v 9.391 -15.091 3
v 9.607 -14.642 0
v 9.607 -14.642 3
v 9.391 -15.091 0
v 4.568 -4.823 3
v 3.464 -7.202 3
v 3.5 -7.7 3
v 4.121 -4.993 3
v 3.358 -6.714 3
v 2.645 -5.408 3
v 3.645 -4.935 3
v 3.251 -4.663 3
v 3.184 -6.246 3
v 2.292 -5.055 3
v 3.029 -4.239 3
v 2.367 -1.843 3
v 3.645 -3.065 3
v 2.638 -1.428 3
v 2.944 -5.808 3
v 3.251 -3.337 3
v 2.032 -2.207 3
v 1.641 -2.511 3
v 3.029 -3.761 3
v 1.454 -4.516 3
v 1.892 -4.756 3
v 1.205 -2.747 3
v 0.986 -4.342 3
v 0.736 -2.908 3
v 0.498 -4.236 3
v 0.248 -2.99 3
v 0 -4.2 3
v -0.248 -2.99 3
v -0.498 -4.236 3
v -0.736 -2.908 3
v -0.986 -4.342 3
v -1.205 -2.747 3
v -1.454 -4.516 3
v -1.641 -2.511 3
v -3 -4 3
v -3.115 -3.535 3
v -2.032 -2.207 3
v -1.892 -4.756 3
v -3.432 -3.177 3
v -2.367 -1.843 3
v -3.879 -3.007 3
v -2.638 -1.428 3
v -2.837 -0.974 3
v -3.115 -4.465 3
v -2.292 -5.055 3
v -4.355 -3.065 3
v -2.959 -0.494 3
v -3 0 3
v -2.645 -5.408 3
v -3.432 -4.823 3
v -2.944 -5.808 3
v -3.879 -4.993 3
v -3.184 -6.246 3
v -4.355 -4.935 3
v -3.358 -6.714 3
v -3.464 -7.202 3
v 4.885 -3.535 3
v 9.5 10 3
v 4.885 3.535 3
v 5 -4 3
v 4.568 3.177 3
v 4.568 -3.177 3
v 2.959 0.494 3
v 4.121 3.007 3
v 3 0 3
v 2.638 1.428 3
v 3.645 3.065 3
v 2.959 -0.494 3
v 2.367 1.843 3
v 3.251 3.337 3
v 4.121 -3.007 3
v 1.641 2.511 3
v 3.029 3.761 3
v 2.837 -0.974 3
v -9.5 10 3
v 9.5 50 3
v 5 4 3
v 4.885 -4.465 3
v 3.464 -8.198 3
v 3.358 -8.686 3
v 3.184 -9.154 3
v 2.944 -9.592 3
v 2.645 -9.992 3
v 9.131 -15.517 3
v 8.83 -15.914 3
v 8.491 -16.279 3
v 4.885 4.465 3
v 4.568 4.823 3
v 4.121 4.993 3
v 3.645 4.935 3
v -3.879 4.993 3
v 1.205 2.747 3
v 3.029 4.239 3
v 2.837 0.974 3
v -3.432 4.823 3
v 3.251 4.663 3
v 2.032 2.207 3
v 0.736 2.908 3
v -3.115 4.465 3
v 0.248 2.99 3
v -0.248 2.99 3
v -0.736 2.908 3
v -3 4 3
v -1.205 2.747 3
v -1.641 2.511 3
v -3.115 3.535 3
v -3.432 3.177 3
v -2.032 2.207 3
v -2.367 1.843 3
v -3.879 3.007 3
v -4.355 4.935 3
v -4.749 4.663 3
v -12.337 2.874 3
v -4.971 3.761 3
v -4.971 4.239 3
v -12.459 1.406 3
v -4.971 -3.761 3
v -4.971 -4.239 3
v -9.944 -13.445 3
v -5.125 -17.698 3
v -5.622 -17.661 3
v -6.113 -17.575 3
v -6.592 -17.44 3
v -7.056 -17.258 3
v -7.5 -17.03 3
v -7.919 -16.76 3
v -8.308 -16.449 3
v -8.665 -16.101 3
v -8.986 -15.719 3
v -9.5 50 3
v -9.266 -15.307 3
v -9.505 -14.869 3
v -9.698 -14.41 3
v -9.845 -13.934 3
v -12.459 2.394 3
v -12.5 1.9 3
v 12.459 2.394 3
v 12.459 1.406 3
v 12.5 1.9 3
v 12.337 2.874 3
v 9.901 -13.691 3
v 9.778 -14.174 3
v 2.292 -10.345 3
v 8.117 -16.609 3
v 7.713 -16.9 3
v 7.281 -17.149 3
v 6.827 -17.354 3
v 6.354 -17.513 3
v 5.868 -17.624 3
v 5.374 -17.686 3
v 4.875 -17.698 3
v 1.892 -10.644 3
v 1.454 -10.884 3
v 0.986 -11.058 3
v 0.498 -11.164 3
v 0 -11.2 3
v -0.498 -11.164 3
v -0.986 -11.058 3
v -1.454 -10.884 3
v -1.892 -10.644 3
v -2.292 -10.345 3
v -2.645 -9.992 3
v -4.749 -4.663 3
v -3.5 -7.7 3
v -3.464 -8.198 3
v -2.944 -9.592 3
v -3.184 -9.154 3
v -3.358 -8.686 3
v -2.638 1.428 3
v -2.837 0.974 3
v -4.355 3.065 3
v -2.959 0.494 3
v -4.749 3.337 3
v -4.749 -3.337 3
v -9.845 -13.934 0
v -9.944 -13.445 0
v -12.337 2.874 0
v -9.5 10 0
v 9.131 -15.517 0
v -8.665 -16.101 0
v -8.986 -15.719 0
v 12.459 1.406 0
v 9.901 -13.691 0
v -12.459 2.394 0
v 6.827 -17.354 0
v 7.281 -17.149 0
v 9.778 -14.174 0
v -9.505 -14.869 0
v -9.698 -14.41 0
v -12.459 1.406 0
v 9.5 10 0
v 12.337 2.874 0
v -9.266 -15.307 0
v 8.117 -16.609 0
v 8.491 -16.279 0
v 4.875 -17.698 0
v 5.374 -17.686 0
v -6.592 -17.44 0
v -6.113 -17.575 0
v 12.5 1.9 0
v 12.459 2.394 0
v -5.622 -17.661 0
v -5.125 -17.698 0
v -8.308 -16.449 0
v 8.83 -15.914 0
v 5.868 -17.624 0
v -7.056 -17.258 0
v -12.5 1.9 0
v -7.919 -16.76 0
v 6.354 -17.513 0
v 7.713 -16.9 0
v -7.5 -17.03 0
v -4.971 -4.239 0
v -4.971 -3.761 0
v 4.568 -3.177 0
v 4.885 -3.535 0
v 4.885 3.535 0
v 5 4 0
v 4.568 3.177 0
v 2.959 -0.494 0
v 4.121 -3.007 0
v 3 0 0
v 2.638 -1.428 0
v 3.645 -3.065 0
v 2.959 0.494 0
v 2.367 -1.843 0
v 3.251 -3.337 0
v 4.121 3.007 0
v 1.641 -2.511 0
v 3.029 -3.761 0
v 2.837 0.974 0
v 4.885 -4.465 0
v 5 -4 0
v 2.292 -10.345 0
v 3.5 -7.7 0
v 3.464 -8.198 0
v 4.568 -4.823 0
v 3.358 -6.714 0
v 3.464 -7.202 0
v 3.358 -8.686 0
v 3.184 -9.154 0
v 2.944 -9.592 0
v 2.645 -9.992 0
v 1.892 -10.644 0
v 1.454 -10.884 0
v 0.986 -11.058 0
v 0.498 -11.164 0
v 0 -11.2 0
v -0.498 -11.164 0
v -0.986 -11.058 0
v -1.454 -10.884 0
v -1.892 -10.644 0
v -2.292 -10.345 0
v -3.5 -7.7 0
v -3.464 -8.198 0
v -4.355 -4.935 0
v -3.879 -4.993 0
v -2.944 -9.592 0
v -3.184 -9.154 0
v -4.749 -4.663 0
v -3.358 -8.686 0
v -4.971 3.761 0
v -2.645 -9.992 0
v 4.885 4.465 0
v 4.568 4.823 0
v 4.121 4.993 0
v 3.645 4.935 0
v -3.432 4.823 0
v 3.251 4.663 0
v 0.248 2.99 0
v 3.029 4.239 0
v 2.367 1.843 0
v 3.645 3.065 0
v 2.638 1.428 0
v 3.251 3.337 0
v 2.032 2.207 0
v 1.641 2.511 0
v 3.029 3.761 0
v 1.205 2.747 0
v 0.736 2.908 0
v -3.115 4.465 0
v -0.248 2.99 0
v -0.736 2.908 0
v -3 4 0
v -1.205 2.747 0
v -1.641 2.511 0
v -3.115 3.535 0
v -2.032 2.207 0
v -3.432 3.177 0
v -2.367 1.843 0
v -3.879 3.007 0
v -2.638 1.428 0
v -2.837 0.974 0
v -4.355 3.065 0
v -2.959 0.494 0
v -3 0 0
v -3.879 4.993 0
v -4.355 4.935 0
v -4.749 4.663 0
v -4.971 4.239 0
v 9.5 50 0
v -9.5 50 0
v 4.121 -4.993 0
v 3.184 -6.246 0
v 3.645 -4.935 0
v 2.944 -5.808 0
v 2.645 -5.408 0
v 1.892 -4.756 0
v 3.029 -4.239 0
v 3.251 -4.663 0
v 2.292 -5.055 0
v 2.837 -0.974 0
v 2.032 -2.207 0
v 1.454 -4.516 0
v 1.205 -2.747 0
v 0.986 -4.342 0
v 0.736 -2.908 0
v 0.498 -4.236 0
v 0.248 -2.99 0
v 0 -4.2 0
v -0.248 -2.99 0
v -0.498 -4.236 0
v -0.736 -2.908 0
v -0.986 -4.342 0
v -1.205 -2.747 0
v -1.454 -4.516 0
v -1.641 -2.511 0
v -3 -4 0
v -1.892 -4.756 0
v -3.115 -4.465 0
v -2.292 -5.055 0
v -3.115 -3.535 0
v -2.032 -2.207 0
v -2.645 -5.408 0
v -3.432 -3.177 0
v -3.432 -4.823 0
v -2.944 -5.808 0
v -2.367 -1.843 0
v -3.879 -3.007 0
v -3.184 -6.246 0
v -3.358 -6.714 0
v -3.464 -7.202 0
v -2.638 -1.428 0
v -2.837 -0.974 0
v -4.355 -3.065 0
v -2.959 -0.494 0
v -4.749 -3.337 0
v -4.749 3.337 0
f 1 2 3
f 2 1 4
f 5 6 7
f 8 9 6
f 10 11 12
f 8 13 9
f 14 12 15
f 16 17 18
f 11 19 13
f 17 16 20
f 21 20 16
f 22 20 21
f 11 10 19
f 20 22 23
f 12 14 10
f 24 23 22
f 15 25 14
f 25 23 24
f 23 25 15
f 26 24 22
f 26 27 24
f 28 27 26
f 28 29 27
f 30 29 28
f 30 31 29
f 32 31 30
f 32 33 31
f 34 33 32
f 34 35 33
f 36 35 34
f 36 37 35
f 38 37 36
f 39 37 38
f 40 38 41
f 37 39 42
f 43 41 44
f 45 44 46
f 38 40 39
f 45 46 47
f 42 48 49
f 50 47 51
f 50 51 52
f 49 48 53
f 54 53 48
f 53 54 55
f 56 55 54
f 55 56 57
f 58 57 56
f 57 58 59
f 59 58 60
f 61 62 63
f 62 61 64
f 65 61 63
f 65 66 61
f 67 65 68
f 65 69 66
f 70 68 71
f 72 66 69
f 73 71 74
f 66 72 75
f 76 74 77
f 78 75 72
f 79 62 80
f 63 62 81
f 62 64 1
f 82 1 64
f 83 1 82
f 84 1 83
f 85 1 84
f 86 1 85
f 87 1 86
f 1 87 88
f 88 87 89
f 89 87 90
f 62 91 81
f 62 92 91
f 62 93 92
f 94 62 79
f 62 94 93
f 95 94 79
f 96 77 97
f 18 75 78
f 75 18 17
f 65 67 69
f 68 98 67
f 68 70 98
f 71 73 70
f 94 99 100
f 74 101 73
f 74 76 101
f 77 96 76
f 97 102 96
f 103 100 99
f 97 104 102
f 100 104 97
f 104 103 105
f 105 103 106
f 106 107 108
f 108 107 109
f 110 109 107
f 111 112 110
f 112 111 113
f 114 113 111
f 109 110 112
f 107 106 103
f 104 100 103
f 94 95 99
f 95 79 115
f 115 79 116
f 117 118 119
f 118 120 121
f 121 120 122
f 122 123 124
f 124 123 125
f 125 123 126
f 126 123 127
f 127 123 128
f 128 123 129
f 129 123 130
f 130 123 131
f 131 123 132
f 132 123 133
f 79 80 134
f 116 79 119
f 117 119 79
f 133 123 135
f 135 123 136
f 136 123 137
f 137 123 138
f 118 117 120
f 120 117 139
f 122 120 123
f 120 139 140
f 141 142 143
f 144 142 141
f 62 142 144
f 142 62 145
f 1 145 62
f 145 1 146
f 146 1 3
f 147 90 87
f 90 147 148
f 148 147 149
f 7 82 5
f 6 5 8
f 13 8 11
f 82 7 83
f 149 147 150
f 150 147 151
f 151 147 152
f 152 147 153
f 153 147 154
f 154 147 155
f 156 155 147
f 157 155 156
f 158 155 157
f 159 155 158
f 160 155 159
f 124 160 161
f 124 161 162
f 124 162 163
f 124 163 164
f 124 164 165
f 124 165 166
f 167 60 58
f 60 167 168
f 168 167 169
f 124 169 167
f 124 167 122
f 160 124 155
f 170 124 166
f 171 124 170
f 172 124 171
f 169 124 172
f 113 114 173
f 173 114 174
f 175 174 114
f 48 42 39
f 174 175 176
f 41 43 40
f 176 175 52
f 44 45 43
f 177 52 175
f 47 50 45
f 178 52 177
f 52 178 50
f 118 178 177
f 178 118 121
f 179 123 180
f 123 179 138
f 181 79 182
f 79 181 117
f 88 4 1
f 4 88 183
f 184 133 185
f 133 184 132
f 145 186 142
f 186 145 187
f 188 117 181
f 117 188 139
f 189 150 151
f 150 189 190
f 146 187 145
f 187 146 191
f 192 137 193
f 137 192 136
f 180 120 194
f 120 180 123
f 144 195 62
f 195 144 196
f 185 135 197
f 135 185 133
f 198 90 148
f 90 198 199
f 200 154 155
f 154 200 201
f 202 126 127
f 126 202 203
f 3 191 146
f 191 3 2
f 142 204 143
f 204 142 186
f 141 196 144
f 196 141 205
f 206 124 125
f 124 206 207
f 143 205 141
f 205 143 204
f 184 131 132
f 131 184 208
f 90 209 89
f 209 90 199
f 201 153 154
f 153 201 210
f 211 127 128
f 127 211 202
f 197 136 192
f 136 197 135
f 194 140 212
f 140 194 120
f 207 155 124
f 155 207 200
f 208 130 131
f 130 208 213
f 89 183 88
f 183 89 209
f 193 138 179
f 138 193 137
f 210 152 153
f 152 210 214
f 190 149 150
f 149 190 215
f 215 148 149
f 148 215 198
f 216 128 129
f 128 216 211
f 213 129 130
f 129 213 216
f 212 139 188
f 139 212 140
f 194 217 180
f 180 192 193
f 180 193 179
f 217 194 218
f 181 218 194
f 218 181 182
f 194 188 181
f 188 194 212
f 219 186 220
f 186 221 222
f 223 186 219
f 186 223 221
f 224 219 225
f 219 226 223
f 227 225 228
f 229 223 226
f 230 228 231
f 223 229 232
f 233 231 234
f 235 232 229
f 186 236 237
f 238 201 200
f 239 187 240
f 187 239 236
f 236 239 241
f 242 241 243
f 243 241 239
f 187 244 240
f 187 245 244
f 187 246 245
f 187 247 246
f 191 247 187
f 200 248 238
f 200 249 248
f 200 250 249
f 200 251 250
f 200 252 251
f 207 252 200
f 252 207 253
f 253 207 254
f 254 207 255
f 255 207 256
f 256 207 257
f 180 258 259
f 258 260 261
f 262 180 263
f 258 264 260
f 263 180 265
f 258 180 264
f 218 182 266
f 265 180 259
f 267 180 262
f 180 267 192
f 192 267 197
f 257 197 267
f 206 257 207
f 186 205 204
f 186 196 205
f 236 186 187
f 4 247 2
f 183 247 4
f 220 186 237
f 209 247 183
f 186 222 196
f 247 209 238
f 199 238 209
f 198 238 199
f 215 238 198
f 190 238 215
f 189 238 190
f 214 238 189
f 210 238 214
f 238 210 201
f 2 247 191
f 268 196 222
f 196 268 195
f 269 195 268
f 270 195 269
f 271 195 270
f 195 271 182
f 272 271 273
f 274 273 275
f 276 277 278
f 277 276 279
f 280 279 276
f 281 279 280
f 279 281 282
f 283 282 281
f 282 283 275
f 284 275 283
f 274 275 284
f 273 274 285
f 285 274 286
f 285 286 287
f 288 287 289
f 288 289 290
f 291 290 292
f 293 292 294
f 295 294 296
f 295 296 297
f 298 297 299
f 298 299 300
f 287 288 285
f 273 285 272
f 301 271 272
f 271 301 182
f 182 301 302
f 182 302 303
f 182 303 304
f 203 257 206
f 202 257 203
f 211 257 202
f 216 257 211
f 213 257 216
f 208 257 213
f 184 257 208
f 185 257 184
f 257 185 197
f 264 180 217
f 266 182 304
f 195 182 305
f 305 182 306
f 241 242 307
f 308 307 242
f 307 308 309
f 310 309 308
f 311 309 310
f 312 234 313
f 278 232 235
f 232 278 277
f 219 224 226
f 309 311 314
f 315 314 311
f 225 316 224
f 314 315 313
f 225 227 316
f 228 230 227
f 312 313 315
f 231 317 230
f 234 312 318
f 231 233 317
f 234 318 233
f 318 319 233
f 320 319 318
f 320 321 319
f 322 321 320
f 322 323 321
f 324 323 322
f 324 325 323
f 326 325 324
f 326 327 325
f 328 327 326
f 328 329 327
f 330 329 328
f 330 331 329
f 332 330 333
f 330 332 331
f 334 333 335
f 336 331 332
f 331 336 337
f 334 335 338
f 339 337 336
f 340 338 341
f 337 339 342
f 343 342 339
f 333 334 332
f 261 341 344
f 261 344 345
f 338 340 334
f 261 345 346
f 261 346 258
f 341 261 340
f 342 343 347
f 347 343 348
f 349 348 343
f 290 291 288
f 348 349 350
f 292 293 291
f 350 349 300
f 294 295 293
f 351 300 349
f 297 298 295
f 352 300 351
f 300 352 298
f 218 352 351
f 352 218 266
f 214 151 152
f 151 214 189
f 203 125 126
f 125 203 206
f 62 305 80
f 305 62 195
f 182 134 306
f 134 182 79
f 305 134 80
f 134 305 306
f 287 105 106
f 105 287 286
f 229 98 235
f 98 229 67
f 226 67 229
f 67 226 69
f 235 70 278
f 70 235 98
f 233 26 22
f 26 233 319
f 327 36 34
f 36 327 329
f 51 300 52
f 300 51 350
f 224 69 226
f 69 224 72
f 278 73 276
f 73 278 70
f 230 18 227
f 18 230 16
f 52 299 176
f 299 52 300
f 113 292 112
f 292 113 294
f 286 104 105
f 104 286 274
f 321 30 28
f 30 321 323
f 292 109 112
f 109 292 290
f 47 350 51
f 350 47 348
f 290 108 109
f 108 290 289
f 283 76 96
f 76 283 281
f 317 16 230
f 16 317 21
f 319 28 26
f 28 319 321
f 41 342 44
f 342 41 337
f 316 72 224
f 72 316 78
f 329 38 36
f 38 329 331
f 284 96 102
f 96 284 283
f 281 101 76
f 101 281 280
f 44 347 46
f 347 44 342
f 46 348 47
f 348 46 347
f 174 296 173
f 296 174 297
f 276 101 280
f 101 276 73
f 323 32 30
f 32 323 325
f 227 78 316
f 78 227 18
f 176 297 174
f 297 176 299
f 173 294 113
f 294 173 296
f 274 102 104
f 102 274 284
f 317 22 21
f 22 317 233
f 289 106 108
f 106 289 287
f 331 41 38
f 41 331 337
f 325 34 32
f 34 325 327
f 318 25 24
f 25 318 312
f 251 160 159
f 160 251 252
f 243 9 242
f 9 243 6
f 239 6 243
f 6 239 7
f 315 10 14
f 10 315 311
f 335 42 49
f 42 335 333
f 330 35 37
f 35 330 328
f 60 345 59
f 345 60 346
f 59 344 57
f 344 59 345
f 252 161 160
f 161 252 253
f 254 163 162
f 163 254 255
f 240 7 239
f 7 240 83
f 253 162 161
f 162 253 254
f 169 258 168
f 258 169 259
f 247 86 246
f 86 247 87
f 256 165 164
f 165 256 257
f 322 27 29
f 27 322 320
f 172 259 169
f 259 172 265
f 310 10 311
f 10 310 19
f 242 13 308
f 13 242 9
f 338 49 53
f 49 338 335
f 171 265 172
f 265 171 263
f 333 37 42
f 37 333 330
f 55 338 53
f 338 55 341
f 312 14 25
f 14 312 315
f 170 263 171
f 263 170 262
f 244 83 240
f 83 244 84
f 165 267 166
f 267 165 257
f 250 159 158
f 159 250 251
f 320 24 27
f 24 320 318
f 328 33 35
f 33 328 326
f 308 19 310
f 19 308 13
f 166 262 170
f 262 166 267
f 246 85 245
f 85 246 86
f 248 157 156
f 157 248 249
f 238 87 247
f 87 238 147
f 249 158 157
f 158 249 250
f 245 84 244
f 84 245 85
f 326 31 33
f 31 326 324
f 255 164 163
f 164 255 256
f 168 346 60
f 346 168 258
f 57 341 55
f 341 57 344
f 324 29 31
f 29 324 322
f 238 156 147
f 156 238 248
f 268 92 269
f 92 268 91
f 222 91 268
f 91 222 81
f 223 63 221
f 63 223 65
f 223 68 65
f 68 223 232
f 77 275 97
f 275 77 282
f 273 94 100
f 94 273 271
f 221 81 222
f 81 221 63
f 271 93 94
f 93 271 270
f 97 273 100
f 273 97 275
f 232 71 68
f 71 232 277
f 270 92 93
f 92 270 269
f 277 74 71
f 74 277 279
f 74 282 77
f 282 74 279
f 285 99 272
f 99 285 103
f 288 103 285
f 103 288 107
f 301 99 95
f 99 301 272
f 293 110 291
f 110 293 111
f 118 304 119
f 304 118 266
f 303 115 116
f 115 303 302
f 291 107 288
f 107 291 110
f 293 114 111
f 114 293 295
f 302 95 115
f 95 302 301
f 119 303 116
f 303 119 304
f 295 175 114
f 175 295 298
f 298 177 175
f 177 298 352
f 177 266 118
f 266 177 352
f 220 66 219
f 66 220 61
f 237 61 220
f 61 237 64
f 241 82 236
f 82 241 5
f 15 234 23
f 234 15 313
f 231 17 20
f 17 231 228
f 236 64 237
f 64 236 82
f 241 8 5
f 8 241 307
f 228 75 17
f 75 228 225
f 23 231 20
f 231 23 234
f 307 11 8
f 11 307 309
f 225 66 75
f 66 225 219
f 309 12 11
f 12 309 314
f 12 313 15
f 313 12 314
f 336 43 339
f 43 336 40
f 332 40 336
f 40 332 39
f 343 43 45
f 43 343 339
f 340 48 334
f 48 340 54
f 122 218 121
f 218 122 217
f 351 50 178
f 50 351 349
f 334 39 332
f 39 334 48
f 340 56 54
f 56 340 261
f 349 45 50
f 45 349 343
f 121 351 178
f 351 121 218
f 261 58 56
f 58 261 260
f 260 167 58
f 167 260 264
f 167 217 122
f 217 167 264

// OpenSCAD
$fa=0.5;
$fs=0.5;

armheight=3.0;

module arm() {
  union() {
  difference() {
    union() {
      hull(){
        translate([-9.5, 1.9, 0])
          cylinder(r=3, h=armheight);
        translate([9.5, 1.9, 0])
          cylinder(r=3, h=armheight);
        
        translate([-5, -12.7, 0])      
          cylinder(r=5, h=armheight);
        translate([5, -12.7, 0])      
          cylinder(r=5, h=armheight);
        
        translate([-9.5, 0, 0])
          cube([19, 10, armheight]);
      }
      
      translate([-9.5, 10, 0])
        cube([19, 40, armheight]);
    }
    union() {
      translate([0, 0, -0.1])
        cylinder(r=3, h=armheight + 1);
      translate([0, -7.7, -0.1])
        cylinder(r=3.5, h=armheight + 1);
      translate([4, 4, 0])
        cylinder(r=1, h=armheight +1);
      translate([-4, 4, 0])
        cylinder(r=1, h=armheight +1);
      translate([4, -4, 0])
        cylinder(r=1, h=armheight +1);
      translate([-4, -4, 0])
        cylinder(r=1, h=armheight +1);
    }
  }
  }
}

arm();
